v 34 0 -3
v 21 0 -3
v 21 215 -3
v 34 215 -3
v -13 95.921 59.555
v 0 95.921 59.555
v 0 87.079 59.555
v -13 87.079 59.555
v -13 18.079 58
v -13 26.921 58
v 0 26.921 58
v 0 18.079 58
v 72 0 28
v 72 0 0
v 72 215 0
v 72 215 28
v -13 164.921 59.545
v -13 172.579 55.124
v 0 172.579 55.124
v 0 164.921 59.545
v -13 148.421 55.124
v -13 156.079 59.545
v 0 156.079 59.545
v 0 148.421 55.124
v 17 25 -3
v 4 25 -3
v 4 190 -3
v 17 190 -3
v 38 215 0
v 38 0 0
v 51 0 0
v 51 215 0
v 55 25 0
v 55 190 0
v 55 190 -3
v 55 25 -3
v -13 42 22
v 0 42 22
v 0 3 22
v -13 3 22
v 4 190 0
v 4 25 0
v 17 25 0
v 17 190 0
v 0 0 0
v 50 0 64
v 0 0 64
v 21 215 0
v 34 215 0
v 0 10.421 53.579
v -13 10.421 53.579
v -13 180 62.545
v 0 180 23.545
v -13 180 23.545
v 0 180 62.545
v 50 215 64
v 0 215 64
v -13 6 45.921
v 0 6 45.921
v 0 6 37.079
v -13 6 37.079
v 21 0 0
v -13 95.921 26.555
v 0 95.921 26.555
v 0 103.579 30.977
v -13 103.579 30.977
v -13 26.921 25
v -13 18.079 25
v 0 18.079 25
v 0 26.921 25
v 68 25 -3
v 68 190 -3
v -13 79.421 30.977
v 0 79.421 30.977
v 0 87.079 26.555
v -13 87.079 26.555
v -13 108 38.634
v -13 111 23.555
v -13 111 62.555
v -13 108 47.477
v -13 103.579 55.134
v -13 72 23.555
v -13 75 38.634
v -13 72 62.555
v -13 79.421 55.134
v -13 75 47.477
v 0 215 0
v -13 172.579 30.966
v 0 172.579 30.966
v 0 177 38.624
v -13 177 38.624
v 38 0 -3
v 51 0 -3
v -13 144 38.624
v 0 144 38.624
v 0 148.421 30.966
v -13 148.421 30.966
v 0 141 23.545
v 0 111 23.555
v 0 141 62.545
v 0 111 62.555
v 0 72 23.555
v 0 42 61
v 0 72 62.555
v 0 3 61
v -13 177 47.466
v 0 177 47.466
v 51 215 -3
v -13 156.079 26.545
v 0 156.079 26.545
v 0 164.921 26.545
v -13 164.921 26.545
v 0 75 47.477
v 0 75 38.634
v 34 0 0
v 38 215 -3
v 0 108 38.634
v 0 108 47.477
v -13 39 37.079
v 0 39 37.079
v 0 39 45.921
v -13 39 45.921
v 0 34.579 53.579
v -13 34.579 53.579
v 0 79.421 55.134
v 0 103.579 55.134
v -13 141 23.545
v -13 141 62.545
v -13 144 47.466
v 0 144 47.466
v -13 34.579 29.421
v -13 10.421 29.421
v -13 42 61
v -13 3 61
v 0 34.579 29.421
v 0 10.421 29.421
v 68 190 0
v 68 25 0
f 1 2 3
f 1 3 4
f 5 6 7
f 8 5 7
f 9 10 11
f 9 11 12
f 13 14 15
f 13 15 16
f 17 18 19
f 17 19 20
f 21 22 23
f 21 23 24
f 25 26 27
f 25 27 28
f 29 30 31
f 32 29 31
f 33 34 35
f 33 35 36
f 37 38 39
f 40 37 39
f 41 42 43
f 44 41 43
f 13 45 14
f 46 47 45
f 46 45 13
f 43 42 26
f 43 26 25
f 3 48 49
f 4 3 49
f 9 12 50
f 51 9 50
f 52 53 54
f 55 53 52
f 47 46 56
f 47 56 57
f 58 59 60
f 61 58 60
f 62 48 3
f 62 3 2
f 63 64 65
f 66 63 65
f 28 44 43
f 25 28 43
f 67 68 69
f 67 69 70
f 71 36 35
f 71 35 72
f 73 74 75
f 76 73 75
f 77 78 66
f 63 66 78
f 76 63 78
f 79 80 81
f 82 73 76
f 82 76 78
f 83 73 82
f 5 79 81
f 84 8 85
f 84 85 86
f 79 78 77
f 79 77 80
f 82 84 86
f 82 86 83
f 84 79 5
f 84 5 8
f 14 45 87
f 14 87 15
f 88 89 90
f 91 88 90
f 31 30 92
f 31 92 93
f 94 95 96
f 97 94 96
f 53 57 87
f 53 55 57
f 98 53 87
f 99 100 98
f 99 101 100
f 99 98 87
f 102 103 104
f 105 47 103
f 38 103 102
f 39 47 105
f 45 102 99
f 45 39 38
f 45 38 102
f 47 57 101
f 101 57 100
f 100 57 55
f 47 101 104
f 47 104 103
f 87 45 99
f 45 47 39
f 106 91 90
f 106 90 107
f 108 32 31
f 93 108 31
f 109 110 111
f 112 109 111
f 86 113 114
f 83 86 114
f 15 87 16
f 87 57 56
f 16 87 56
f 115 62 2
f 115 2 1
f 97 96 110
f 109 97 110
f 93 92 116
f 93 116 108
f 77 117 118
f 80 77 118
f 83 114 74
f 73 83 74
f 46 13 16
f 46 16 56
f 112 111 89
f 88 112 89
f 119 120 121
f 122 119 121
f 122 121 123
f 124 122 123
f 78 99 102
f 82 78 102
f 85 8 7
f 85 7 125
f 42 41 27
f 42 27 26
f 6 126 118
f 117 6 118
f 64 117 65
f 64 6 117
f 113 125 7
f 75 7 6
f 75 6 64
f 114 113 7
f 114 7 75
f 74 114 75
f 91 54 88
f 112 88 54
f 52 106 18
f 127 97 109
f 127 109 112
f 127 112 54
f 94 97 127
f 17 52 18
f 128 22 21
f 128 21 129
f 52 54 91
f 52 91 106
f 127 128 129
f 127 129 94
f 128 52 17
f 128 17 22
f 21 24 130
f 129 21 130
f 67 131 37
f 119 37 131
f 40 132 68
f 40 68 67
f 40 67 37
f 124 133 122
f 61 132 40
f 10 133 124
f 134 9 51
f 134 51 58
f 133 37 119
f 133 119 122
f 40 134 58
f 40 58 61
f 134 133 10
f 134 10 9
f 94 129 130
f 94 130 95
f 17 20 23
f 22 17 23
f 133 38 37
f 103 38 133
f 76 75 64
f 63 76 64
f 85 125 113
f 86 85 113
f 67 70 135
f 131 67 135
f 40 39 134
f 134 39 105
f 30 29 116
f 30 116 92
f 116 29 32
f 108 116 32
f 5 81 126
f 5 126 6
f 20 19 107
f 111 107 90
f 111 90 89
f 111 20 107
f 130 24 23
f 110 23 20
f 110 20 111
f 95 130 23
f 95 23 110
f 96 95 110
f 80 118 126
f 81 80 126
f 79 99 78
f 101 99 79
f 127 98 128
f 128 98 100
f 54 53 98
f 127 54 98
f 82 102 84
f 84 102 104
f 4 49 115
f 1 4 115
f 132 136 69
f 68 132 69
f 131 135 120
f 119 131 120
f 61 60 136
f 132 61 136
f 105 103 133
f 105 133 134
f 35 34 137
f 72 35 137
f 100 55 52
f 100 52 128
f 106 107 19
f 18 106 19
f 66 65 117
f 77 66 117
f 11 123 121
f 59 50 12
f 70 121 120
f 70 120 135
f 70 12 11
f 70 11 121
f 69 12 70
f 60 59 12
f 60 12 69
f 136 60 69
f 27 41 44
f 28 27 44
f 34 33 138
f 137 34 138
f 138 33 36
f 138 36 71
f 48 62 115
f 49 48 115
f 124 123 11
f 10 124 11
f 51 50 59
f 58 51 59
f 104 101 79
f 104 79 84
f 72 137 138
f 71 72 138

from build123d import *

# Parameters (mm, degrees)
F1_DEPTH = 215
F2_W     = 39
F2_H     = 39
F3_DEPTH = 13
F4_W     = 39
F4_H     = 39
F5_DEPTH = 13
F6_W     = 13
F6_H     = 215
F7_DEPTH = 3
F6_H_2   = 165


with BuildPart() as f1:
    # F0 (on Front) → F1 (new body)
    with BuildSketch(Plane.XZ):
        Polygon((0, 64), (0, 0), (72, 0), (72, 28), (50, 64), align=None)
    extrude(amount=-F1_DEPTH)

    # F2 (on face) → F3 (join)
    with BuildSketch(Plane(origin=(0, 0, 0), x_dir=(0, -1, 0), z_dir=(-1, 0, 0))):
        with Locations((-22.5, 41.5)):
            Rectangle(F2_W, F2_H)
        Polygon((-26.9211616751, 58), (-18.0788383249, 58), (-10.4211616751, 53.5788383249), (-6, 45.9211616751), (-6, 37.0788383249), (-10.4211616751, 29.4211616751), (-18.0788383249, 25), (-26.9211616751, 25), (-34.5788383249, 29.4211616751), (-39, 37.0788383249), (-39, 45.9211616751), (-34.5788383249, 53.5788383249), align=None, mode=Mode.SUBTRACT)
    extrude(amount=F3_DEPTH)

    # F4 (on face) → F5 (join, through all)
    with BuildSketch(Plane(origin=(0, 0, 0), x_dir=(0, -1, 0), z_dir=(-1, 0, 0))):
        with Locations((-91.5, 43.0553856975)):
            Rectangle(F4_W, F4_H)
        Polygon((-95.9211616751, 59.5553856975), (-87.0788383249, 59.5553856975), (-79.4211616751, 55.1342240224), (-75, 47.4765473726), (-75, 38.6342240224), (-79.4211616751, 30.9765473726), (-87.0788383249, 26.5553856975), (-95.9211616751, 26.5553856975), (-103.5788383249, 30.9765473726), (-108, 38.6342240224), (-108, 47.4765473726), (-103.5788383249, 55.1342240224), align=None, mode=Mode.SUBTRACT)
        with Locations((-160.5, 43.0450536048)):
            Rectangle(F4_W, F4_H)
        Polygon((-164.9211616751, 59.5450536048), (-156.0788383249, 59.5450536048), (-148.4211616751, 55.1238919297), (-144, 47.4662152799), (-144, 38.6238919297), (-148.4211616751, 30.9662152799), (-156.0788383249, 26.5450536048), (-164.9211616751, 26.5450536048), (-172.5788383249, 30.9662152799), (-177, 38.6238919297), (-177, 47.4662152799), (-172.5788383249, 55.1238919297), align=None, mode=Mode.SUBTRACT)
    extrude(amount=F5_DEPTH)


with BuildPart() as f7:
    # F6 (on face) → F7 (new body)
    with BuildSketch(Plane(origin=(0, 0, 0), x_dir=(1, 0, 0), z_dir=(0, 0, -1))):
        with Locations((27.5, -107.5)):
            Rectangle(F6_W, F6_H)
    extrude(amount=F7_DEPTH)


with BuildPart() as f7b:
    # F6 (on face) → F7, piece 2 (new body)
    with BuildSketch(Plane(origin=(0, 0, 0), x_dir=(1, 0, 0), z_dir=(0, 0, -1))):
        with Locations((44.5, -107.5)):
            Rectangle(F6_W, F6_H)
    extrude(amount=F7_DEPTH)


with BuildPart() as f7c:
    # F6 (on face) → F7, piece 3 (new body)
    with BuildSketch(Plane(origin=(0, 0, 0), x_dir=(1, 0, 0), z_dir=(0, 0, -1))):
        with Locations((10.5, -107.5)):
            Rectangle(F6_W, F6_H_2)
    extrude(amount=F7_DEPTH)


with BuildPart() as f7d:
    # F6 (on face) → F7, piece 4 (new body)
    with BuildSketch(Plane(origin=(0, 0, 0), x_dir=(1, 0, 0), z_dir=(0, 0, -1))):
        with Locations((61.5, -107.5)):
            Rectangle(F6_W, F6_H_2)
    extrude(amount=F7_DEPTH)


solid = Compound([f1.part, f7.part, f7b.part, f7c.part, f7d.part])
